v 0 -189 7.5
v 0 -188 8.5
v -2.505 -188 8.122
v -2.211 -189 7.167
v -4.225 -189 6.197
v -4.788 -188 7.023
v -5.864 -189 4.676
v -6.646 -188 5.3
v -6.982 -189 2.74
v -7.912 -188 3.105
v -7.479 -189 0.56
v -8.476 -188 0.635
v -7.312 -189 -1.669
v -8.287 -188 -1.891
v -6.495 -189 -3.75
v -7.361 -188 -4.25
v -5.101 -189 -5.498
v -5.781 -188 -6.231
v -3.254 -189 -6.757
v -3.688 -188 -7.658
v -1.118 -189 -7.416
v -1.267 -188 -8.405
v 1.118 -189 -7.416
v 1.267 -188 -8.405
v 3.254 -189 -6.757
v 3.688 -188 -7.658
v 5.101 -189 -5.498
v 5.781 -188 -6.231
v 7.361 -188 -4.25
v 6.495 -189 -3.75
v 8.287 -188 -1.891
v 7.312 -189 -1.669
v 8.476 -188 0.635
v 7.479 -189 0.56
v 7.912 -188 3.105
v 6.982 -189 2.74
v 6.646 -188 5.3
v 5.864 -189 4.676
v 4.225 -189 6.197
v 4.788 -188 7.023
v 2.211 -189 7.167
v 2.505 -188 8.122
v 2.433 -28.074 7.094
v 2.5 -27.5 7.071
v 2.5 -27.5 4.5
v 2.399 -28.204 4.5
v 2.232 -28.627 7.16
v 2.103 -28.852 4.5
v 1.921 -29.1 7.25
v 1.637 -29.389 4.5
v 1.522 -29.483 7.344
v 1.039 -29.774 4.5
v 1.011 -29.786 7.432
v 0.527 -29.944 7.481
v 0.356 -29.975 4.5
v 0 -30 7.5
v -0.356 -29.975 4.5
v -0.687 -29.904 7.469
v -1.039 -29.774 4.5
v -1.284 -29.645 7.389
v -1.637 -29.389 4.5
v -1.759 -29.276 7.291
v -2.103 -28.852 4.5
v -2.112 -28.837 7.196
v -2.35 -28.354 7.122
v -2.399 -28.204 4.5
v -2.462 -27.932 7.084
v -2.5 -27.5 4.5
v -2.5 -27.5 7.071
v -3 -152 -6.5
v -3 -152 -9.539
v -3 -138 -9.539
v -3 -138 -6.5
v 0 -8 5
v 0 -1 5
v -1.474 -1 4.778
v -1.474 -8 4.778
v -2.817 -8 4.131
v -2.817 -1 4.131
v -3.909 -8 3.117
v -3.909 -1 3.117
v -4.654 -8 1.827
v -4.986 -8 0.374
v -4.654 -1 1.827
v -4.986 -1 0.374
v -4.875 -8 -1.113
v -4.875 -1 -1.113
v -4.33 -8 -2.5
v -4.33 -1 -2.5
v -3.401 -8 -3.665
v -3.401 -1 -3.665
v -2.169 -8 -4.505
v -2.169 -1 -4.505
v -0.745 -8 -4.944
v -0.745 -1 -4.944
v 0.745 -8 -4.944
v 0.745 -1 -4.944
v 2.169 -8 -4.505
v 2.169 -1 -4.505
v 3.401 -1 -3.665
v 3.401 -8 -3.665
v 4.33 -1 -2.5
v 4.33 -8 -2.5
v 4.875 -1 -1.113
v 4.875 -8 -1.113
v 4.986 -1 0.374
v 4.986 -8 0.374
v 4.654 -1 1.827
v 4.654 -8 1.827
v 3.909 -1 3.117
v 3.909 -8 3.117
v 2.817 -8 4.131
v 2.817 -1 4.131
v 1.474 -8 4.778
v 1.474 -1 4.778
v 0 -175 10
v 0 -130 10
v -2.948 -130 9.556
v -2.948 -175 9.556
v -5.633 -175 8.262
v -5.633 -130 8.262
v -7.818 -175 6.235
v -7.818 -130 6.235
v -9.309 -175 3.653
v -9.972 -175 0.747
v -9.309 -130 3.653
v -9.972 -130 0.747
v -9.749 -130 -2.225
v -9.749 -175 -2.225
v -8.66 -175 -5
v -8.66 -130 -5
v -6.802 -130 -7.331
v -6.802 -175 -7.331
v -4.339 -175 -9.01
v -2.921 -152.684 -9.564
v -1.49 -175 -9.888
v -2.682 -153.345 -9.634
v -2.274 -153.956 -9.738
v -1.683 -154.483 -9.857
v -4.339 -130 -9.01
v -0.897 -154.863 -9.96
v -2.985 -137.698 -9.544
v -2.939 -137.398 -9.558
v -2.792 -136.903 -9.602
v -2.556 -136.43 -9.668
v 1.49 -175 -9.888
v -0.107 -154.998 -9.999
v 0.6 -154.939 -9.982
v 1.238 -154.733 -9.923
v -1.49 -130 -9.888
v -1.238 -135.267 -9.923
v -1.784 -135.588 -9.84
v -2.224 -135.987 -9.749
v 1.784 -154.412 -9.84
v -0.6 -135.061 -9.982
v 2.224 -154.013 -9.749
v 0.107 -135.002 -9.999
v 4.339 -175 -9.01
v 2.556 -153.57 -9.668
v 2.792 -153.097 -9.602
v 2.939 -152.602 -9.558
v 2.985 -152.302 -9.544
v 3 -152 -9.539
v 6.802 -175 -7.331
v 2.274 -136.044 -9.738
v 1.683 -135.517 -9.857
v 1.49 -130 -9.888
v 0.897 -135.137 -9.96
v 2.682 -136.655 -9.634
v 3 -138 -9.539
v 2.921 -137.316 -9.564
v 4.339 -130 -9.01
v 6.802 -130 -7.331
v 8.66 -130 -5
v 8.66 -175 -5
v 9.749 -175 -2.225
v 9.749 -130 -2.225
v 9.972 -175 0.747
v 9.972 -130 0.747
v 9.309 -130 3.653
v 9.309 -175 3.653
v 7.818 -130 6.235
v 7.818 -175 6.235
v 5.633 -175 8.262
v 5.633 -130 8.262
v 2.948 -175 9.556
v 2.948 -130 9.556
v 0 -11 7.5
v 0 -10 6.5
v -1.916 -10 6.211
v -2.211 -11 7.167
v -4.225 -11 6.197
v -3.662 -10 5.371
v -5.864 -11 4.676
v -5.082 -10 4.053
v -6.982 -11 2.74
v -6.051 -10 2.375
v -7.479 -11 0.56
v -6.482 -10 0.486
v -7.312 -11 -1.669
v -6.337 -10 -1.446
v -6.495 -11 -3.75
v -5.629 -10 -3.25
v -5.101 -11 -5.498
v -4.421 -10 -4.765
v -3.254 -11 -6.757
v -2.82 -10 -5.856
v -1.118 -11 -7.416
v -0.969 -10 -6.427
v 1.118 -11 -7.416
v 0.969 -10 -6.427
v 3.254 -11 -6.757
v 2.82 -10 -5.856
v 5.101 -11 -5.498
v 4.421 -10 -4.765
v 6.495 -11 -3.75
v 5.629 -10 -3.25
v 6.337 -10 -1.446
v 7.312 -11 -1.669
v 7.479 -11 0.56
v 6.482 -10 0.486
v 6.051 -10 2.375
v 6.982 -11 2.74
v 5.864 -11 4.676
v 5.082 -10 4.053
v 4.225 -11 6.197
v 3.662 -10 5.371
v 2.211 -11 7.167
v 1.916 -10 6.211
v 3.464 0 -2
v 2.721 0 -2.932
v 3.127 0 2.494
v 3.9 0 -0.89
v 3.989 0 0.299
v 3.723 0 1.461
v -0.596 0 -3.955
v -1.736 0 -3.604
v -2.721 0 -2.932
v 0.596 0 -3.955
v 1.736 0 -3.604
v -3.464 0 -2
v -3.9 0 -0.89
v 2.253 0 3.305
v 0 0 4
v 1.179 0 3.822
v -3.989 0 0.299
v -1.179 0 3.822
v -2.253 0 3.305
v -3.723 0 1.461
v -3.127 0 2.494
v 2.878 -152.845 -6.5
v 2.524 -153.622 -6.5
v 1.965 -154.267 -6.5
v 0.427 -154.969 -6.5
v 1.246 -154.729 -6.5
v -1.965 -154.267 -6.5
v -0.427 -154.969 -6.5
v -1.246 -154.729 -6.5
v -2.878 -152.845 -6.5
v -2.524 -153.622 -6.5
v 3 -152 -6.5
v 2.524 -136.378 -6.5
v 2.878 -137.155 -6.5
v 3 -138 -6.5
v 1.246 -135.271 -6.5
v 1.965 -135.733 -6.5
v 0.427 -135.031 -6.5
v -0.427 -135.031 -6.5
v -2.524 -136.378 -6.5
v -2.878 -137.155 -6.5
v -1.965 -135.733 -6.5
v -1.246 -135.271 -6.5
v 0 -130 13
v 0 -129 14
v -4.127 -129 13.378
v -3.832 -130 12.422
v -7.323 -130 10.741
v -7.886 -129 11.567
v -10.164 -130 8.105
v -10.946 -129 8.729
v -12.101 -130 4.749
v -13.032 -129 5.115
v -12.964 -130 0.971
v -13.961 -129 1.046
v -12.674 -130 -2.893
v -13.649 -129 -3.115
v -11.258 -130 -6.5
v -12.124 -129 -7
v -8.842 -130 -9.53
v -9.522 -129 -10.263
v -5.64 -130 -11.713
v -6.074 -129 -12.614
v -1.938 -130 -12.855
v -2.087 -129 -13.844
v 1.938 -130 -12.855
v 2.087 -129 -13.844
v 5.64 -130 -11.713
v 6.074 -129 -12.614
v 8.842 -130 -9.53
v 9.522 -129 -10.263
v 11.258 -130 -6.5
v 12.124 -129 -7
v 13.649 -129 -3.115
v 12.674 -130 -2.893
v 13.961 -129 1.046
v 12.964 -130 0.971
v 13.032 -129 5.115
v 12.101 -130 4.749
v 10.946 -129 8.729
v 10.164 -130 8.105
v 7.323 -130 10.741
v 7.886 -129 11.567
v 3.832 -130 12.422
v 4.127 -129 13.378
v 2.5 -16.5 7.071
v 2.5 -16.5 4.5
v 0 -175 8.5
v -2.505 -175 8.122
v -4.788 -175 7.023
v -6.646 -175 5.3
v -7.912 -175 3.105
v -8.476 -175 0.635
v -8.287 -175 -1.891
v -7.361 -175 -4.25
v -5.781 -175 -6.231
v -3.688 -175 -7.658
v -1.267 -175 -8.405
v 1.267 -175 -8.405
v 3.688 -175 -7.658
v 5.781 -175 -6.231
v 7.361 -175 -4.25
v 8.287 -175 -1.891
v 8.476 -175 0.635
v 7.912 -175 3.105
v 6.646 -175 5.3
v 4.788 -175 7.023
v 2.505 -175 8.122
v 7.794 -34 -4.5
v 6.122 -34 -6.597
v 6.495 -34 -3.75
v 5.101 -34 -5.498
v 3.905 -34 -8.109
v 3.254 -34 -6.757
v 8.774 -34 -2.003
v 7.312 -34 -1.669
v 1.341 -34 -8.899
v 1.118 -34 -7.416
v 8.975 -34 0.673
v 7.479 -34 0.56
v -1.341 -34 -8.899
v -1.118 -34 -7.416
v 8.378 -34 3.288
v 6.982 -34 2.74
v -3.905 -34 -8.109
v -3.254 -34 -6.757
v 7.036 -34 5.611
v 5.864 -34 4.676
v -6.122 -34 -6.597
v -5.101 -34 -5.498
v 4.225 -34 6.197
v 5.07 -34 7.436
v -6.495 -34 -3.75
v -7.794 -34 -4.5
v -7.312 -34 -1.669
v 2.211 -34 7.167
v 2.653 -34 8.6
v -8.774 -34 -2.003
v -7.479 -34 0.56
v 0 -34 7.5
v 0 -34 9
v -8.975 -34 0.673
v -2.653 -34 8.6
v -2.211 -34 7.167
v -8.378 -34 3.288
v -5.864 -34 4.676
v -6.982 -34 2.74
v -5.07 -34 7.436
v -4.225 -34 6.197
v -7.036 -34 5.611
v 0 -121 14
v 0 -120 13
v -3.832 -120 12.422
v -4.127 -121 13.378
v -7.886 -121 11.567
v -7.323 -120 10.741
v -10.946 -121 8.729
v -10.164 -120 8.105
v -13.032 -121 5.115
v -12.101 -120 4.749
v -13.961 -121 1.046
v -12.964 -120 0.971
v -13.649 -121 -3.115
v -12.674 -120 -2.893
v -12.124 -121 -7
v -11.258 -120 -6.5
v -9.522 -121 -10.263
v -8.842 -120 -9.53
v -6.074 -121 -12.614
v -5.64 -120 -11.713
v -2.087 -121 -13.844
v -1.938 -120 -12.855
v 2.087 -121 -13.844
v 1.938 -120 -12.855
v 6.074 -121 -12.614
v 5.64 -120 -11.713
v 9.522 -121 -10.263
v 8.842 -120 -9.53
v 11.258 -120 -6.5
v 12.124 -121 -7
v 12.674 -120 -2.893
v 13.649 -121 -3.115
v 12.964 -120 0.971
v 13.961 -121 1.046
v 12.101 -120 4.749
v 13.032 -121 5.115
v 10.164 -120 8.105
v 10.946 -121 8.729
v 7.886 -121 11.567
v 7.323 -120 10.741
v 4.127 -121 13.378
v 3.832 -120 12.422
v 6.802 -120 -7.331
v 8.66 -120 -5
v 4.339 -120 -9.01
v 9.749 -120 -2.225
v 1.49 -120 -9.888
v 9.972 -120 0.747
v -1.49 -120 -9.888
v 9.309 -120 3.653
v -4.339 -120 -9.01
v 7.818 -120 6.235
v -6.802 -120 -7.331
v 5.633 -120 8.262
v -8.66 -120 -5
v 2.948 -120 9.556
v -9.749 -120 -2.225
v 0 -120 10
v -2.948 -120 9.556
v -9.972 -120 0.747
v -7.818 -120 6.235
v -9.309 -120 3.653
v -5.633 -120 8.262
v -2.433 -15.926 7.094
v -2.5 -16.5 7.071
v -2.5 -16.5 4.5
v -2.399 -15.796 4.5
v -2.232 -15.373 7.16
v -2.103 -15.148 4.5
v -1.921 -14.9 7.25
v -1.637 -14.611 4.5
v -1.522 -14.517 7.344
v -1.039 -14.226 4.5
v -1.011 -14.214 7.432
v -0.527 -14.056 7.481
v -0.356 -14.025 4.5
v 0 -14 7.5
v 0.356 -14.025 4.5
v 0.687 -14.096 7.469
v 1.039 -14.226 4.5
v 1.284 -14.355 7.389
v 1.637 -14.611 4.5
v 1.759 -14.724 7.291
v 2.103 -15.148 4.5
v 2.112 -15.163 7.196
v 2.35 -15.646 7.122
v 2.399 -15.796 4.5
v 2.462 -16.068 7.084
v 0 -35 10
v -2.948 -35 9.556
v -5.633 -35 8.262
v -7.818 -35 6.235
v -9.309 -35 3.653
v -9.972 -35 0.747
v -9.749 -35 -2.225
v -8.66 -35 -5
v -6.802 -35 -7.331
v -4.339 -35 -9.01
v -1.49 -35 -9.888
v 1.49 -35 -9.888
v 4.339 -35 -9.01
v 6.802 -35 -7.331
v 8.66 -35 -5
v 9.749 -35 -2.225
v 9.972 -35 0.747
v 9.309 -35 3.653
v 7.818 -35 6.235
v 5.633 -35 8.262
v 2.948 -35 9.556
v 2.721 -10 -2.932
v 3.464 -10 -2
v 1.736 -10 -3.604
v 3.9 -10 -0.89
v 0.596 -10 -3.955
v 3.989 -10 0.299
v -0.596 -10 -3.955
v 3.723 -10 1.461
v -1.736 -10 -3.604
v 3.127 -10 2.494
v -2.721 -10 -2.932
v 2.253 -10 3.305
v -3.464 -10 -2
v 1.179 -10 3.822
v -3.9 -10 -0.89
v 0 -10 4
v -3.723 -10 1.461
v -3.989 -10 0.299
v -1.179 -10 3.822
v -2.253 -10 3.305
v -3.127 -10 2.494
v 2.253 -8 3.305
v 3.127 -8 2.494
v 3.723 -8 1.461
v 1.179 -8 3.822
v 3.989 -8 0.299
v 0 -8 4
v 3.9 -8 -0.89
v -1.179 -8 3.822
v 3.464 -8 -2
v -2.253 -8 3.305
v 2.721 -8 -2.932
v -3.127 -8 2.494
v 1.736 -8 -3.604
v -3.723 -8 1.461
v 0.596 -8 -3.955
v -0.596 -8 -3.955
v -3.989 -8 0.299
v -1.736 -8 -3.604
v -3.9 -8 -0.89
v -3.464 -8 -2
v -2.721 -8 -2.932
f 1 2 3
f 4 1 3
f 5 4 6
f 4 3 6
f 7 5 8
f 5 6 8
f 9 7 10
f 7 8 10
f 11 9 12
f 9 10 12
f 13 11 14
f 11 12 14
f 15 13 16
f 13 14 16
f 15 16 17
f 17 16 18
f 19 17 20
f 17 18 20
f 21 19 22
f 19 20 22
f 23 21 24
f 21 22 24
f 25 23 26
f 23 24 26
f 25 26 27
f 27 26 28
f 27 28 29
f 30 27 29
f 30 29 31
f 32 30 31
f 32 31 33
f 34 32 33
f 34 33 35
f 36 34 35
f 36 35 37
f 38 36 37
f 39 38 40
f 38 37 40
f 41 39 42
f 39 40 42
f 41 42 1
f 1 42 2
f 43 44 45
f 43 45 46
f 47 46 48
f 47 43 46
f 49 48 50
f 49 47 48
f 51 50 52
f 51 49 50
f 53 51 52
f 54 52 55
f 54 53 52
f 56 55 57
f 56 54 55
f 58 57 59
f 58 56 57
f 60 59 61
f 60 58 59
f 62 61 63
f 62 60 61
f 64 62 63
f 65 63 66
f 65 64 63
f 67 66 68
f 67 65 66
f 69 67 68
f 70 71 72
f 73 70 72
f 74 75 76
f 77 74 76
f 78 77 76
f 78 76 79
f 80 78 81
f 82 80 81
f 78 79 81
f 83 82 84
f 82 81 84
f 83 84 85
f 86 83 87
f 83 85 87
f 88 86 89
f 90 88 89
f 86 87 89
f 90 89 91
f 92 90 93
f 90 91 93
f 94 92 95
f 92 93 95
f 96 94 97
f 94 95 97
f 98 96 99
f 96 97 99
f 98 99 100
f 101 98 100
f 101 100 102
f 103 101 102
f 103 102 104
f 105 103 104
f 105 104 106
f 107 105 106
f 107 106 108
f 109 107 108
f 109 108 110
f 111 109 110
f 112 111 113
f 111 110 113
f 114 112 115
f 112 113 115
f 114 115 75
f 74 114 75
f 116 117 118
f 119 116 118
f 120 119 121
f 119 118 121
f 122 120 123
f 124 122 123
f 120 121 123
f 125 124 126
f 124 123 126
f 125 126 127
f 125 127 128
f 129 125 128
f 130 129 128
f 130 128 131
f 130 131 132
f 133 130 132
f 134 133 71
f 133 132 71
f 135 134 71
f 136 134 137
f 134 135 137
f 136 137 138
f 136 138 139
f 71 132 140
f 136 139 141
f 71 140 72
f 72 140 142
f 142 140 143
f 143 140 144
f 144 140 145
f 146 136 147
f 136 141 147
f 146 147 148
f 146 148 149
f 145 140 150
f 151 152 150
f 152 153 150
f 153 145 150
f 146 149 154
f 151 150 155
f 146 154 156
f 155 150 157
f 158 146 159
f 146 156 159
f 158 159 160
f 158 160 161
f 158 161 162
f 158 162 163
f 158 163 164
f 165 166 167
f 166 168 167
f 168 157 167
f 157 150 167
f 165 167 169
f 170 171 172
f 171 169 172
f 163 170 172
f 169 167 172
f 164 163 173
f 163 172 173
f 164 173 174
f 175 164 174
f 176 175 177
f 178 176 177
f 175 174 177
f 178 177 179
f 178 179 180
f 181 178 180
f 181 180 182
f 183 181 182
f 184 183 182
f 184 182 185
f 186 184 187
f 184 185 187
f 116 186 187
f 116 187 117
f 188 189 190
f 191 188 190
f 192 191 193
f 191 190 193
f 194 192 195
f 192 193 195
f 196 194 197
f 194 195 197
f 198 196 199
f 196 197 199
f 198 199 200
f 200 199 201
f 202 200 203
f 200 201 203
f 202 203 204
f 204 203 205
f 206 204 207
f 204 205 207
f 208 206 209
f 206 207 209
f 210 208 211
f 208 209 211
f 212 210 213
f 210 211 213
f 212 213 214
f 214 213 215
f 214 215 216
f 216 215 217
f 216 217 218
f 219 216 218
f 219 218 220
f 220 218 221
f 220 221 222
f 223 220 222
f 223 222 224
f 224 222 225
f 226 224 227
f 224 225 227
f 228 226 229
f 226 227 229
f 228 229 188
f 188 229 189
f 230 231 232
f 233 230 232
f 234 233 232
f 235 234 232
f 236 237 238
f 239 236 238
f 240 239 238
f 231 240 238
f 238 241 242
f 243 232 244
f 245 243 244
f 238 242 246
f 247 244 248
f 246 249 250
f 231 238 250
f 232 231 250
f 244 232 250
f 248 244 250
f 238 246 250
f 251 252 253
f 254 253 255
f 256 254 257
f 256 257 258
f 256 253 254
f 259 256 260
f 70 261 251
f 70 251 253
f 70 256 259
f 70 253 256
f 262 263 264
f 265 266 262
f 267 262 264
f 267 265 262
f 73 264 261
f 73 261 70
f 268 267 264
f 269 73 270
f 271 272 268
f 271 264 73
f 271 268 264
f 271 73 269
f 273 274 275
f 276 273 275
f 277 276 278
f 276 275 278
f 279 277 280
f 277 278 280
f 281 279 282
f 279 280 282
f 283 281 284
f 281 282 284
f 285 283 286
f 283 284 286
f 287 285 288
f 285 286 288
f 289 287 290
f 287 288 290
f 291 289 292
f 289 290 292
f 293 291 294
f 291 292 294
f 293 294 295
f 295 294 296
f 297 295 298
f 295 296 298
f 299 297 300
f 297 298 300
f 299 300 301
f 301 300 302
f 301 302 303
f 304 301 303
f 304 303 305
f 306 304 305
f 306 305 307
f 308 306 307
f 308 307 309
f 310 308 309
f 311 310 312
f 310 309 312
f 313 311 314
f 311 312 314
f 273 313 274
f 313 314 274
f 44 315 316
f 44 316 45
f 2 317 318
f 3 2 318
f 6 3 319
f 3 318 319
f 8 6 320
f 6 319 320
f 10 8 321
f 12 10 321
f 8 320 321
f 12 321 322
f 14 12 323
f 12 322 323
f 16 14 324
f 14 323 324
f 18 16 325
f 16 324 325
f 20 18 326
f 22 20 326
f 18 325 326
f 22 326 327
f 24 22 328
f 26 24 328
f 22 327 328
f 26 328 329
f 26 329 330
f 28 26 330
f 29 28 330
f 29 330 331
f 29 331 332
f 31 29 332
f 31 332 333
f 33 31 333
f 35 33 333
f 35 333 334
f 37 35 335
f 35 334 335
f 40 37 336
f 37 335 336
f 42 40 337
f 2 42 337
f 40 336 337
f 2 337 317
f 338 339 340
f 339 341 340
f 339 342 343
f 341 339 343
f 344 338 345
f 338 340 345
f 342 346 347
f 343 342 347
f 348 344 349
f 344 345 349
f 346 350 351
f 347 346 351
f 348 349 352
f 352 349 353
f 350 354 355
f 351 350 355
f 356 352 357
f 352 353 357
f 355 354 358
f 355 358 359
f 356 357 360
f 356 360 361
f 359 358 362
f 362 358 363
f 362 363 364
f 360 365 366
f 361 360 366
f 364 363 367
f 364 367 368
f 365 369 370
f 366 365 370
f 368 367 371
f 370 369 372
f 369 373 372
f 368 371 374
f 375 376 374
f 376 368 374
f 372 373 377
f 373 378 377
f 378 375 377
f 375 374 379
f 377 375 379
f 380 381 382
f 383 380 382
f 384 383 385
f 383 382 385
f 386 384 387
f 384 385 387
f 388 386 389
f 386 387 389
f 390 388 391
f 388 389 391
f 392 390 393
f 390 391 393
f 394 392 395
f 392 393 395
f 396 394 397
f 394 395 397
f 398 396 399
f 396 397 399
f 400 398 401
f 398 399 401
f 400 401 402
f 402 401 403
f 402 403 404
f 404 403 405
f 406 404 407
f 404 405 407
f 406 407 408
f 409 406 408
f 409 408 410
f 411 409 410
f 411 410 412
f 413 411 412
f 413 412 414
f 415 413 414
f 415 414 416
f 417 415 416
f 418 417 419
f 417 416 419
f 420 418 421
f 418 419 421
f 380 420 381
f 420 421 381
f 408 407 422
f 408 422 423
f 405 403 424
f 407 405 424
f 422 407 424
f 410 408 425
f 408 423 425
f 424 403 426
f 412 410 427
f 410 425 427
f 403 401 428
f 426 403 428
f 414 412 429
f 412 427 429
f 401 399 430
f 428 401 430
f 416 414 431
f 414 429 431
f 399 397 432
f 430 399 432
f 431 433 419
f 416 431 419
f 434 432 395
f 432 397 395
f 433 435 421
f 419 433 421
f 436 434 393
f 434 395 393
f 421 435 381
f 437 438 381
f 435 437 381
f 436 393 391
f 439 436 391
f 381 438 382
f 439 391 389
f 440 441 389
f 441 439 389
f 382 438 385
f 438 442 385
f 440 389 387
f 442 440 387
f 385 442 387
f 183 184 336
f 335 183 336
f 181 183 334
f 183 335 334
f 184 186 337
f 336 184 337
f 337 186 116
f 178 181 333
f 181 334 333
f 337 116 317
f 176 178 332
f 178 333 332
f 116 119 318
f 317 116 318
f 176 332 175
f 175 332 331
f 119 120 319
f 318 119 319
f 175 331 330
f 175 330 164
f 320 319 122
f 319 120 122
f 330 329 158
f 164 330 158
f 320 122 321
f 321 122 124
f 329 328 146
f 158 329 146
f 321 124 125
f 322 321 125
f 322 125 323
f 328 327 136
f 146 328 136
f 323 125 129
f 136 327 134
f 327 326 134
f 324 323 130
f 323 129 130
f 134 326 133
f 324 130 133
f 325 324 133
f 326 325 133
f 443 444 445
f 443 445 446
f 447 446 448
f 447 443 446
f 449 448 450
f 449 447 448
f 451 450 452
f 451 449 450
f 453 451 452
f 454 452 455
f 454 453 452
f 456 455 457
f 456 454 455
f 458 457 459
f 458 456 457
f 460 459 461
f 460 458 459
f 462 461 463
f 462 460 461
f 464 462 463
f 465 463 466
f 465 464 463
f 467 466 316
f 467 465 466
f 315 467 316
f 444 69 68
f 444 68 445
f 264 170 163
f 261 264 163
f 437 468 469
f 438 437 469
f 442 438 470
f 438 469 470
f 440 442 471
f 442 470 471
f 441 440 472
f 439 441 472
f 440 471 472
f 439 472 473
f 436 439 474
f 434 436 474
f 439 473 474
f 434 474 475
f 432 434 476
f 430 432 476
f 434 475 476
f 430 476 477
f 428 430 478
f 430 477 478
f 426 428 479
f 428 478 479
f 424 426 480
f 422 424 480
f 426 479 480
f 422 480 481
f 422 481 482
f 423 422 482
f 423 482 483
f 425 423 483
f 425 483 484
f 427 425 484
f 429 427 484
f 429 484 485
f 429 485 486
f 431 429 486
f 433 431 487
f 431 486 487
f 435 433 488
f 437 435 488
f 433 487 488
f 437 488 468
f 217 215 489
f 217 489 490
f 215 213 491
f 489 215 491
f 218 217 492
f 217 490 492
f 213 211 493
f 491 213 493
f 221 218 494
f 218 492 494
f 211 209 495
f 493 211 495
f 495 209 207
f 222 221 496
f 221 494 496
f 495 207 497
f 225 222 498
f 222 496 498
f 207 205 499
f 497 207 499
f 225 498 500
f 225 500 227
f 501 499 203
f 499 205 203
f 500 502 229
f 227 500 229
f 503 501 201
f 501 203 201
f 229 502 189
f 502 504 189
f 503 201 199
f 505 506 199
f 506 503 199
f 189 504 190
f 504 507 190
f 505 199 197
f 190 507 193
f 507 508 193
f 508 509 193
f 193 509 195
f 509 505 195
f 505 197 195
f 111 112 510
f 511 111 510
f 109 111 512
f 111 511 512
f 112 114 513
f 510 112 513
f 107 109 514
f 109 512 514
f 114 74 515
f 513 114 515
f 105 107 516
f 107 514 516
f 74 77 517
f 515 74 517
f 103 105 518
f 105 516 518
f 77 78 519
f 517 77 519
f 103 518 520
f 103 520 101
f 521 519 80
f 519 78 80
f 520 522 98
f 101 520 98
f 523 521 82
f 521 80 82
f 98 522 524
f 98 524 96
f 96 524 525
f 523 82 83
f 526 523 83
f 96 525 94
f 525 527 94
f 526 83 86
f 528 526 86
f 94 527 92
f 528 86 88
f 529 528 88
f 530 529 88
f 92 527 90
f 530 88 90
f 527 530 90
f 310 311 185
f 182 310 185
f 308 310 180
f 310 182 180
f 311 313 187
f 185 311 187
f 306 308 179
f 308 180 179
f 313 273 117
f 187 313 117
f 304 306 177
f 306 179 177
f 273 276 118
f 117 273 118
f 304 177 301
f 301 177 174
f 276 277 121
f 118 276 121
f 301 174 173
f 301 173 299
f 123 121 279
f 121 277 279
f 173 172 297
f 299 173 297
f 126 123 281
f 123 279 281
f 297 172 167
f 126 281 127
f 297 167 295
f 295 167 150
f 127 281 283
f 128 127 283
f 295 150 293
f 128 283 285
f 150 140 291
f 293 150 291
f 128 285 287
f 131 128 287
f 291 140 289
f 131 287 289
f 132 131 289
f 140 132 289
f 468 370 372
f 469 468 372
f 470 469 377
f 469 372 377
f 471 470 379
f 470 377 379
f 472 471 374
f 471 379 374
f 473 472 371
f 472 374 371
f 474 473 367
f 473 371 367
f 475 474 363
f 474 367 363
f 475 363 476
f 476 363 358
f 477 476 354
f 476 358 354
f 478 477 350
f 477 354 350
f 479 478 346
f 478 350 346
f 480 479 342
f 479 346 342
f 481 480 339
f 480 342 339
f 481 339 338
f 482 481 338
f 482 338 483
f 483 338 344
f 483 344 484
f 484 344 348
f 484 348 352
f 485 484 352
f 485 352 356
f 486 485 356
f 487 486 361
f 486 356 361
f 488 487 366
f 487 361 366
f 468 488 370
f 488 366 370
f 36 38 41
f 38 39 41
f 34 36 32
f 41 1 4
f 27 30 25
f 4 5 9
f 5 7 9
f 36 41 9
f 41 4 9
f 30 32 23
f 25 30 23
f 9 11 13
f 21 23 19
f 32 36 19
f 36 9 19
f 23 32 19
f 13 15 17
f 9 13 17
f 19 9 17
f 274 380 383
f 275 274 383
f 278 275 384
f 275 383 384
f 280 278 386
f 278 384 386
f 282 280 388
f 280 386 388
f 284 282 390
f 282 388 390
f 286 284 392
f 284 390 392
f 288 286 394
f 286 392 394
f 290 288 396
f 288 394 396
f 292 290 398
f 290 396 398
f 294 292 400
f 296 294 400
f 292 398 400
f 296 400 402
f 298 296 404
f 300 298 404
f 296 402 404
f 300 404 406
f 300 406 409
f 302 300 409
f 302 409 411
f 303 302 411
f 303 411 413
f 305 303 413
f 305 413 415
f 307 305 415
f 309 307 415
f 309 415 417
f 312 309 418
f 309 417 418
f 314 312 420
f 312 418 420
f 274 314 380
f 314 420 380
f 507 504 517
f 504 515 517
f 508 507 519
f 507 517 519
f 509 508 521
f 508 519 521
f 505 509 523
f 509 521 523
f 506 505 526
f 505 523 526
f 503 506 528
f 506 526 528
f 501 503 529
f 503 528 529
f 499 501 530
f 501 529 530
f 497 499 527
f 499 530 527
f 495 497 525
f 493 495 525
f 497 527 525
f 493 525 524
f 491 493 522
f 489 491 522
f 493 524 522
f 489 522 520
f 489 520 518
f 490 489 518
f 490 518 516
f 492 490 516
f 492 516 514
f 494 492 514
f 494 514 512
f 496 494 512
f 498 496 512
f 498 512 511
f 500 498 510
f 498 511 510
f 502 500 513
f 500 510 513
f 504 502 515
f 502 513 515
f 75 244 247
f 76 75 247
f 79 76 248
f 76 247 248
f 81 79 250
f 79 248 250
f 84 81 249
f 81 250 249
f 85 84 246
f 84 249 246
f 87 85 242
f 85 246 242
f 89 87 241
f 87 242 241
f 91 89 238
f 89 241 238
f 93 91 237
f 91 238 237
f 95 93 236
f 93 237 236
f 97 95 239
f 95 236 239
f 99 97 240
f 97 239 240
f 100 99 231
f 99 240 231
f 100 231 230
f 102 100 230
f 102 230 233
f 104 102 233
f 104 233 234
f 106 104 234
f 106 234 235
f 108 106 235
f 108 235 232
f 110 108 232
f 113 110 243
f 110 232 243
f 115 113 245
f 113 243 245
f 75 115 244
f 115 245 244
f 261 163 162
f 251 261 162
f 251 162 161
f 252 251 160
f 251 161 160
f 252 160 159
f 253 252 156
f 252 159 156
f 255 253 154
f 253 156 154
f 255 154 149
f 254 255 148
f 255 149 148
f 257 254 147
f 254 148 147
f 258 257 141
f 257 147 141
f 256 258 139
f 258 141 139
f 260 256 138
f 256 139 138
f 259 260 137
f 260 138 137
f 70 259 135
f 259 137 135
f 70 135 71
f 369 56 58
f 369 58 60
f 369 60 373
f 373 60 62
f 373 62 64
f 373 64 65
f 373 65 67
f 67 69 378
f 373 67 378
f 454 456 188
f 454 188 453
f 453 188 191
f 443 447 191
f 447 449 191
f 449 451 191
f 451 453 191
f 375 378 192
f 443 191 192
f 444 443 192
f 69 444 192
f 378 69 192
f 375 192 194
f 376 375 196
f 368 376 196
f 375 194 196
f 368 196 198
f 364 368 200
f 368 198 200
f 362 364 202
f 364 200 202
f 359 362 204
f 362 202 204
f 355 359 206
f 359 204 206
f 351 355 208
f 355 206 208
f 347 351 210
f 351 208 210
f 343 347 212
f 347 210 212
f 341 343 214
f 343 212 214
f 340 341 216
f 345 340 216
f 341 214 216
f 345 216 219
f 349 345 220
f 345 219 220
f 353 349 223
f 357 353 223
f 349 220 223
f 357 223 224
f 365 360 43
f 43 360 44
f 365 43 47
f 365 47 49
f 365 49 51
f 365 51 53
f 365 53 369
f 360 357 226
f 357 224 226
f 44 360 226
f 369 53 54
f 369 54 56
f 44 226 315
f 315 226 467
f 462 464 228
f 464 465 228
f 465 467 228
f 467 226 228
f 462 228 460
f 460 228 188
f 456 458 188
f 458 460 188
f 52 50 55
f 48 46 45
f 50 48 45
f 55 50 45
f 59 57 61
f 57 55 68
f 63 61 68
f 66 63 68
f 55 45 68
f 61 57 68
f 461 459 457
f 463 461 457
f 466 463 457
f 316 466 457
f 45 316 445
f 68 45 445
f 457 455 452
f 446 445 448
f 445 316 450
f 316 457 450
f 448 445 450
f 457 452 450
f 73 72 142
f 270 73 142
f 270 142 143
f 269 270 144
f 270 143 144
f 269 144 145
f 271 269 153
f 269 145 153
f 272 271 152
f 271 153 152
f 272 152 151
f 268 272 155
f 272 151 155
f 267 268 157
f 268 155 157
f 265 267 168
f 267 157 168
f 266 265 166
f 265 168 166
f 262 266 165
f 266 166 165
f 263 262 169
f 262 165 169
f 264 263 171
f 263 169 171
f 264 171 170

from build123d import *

# Parameters (mm, degrees)
CHAMFER1_SIZE      = 1
CUT_EXTRUDE1_DEPTH = 3
CUT_EXTRUDE2_DEPTH = 3.5


with BuildPart() as part:
    # Sketch1 → Revolve1 (revolve)
    with BuildSketch(Plane.XY, mode=Mode.PRIVATE) as revolve1_sk:
        Polygon((0, 0), (0, -189), (-8.5, -189), (-8.5, -175), (-10, -175), (-10, -130), (-14, -130), (-14, -120), (-10, -120), (-10, -34), (-7.5, -34), (-7.5, -10), (-4, -10), (-4, -8), (-5, -8), (-5, 0), align=None)
    revolve(revolve1_sk.sketch.rotate(Axis((0, 0, 0), (0, -1, 0)), 270), axis=Axis((0, 0, 0), (0, -1, 0)))

    # Chamfer1
    chamfer1_edges = [part.edges().sort_by_distance(p)[0] for p in [
        (0, -189, -8.5),
        (0, -130, -14),
        (0, -120, -14),
        (0, -34, -10),
        (0, -10, -7.5),
        (0, 0, -5),
    ]]
    chamfer(chamfer1_edges, length=CHAMFER1_SIZE)

    # Sketch2 → Cut-Extrude1 (cut)
    with BuildSketch(Plane.XY.offset(7.5)):
        with BuildLine():
            Line((2.5, -16.5), (2.5, -27.5))
            ThreePointArc((2.5, -27.5), (0, -30), (-2.5, -27.5))
            Line((-2.5, -27.5), (-2.5, -16.5))
            ThreePointArc((-2.5, -16.5), (0, -14), (2.5, -16.5))
        make_face()
    extrude(amount=-CUT_EXTRUDE1_DEPTH, mode=Mode.SUBTRACT)

    # Sketch3 → Cut-Extrude2 (cut)
    with BuildSketch(Plane.XY.offset(-10)):
        with BuildLine():
            Line((-3, -152), (-3, -138))
            ThreePointArc((-3, -138), (0, -135), (3, -138))
            Line((3, -138), (3, -152))
            ThreePointArc((3, -152), (0, -155), (-3, -152))
        make_face()
    extrude(amount=CUT_EXTRUDE2_DEPTH, mode=Mode.SUBTRACT)


solid = part.part
